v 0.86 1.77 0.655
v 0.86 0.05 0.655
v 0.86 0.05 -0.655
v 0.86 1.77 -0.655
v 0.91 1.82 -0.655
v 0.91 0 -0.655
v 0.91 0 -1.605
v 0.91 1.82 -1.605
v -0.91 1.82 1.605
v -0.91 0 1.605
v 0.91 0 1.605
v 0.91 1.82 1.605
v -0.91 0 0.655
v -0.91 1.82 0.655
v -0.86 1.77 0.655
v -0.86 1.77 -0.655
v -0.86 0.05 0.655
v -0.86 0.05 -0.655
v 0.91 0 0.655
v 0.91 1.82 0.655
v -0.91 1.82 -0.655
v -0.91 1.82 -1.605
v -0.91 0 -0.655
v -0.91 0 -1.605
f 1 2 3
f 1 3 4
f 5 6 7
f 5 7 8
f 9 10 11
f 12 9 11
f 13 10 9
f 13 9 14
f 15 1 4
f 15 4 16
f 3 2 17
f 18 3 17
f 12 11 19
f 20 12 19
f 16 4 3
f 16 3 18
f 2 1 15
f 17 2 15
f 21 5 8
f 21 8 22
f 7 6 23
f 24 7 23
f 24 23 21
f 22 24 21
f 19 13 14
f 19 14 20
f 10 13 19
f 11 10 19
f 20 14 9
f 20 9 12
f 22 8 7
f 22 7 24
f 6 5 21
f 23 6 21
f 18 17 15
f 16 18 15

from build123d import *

# Parameters (mm, degrees)
SKETCH2_W           = 1.82
SKETCH2_H           = 0.95
BOSS_EXTRUDE1_DEPTH = 1.82
SKETCH4_W           = 1.72
SKETCH4_H           = 1.72
BOSS_EXTRUDE2_DEPTH = 1.31
SKETCH5_W           = 1.82
SKETCH5_H           = 1.82
BOSS_EXTRUDE3_DEPTH = 0.95


with BuildPart() as part:
    # Sketch2 → Boss-Extrude1 (new body)
    with BuildSketch(Plane(origin=(0, 0, 0), x_dir=(1, 0, 0), z_dir=(0, 1, 0))):
        with Locations((0, -1.13)):
            Rectangle(SKETCH2_W, SKETCH2_H)
    extrude(amount=BOSS_EXTRUDE1_DEPTH)


with BuildPart() as body_2:
    # Sketch4 → Boss-Extrude2 (new body)
    with BuildSketch(Plane(origin=(0, 0, 0.655), x_dir=(-1, 0, 0), z_dir=(0, 0, -1))):
        with Locations((0, 0.91)):
            Rectangle(SKETCH4_W, SKETCH4_H)
    extrude(amount=BOSS_EXTRUDE2_DEPTH)


with BuildPart() as body_3:
    # Sketch5 → Boss-Extrude3 (new body)
    with BuildSketch(Plane(origin=(0, 0, -0.655), x_dir=(-1, 0, 0), z_dir=(0, 0, -1))):
        with Locations((0, 0.91)):
            Rectangle(SKETCH5_W, SKETCH5_H)
    extrude(amount=BOSS_EXTRUDE3_DEPTH)


solid = Compound([part.part, body_2.part, body_3.part])
